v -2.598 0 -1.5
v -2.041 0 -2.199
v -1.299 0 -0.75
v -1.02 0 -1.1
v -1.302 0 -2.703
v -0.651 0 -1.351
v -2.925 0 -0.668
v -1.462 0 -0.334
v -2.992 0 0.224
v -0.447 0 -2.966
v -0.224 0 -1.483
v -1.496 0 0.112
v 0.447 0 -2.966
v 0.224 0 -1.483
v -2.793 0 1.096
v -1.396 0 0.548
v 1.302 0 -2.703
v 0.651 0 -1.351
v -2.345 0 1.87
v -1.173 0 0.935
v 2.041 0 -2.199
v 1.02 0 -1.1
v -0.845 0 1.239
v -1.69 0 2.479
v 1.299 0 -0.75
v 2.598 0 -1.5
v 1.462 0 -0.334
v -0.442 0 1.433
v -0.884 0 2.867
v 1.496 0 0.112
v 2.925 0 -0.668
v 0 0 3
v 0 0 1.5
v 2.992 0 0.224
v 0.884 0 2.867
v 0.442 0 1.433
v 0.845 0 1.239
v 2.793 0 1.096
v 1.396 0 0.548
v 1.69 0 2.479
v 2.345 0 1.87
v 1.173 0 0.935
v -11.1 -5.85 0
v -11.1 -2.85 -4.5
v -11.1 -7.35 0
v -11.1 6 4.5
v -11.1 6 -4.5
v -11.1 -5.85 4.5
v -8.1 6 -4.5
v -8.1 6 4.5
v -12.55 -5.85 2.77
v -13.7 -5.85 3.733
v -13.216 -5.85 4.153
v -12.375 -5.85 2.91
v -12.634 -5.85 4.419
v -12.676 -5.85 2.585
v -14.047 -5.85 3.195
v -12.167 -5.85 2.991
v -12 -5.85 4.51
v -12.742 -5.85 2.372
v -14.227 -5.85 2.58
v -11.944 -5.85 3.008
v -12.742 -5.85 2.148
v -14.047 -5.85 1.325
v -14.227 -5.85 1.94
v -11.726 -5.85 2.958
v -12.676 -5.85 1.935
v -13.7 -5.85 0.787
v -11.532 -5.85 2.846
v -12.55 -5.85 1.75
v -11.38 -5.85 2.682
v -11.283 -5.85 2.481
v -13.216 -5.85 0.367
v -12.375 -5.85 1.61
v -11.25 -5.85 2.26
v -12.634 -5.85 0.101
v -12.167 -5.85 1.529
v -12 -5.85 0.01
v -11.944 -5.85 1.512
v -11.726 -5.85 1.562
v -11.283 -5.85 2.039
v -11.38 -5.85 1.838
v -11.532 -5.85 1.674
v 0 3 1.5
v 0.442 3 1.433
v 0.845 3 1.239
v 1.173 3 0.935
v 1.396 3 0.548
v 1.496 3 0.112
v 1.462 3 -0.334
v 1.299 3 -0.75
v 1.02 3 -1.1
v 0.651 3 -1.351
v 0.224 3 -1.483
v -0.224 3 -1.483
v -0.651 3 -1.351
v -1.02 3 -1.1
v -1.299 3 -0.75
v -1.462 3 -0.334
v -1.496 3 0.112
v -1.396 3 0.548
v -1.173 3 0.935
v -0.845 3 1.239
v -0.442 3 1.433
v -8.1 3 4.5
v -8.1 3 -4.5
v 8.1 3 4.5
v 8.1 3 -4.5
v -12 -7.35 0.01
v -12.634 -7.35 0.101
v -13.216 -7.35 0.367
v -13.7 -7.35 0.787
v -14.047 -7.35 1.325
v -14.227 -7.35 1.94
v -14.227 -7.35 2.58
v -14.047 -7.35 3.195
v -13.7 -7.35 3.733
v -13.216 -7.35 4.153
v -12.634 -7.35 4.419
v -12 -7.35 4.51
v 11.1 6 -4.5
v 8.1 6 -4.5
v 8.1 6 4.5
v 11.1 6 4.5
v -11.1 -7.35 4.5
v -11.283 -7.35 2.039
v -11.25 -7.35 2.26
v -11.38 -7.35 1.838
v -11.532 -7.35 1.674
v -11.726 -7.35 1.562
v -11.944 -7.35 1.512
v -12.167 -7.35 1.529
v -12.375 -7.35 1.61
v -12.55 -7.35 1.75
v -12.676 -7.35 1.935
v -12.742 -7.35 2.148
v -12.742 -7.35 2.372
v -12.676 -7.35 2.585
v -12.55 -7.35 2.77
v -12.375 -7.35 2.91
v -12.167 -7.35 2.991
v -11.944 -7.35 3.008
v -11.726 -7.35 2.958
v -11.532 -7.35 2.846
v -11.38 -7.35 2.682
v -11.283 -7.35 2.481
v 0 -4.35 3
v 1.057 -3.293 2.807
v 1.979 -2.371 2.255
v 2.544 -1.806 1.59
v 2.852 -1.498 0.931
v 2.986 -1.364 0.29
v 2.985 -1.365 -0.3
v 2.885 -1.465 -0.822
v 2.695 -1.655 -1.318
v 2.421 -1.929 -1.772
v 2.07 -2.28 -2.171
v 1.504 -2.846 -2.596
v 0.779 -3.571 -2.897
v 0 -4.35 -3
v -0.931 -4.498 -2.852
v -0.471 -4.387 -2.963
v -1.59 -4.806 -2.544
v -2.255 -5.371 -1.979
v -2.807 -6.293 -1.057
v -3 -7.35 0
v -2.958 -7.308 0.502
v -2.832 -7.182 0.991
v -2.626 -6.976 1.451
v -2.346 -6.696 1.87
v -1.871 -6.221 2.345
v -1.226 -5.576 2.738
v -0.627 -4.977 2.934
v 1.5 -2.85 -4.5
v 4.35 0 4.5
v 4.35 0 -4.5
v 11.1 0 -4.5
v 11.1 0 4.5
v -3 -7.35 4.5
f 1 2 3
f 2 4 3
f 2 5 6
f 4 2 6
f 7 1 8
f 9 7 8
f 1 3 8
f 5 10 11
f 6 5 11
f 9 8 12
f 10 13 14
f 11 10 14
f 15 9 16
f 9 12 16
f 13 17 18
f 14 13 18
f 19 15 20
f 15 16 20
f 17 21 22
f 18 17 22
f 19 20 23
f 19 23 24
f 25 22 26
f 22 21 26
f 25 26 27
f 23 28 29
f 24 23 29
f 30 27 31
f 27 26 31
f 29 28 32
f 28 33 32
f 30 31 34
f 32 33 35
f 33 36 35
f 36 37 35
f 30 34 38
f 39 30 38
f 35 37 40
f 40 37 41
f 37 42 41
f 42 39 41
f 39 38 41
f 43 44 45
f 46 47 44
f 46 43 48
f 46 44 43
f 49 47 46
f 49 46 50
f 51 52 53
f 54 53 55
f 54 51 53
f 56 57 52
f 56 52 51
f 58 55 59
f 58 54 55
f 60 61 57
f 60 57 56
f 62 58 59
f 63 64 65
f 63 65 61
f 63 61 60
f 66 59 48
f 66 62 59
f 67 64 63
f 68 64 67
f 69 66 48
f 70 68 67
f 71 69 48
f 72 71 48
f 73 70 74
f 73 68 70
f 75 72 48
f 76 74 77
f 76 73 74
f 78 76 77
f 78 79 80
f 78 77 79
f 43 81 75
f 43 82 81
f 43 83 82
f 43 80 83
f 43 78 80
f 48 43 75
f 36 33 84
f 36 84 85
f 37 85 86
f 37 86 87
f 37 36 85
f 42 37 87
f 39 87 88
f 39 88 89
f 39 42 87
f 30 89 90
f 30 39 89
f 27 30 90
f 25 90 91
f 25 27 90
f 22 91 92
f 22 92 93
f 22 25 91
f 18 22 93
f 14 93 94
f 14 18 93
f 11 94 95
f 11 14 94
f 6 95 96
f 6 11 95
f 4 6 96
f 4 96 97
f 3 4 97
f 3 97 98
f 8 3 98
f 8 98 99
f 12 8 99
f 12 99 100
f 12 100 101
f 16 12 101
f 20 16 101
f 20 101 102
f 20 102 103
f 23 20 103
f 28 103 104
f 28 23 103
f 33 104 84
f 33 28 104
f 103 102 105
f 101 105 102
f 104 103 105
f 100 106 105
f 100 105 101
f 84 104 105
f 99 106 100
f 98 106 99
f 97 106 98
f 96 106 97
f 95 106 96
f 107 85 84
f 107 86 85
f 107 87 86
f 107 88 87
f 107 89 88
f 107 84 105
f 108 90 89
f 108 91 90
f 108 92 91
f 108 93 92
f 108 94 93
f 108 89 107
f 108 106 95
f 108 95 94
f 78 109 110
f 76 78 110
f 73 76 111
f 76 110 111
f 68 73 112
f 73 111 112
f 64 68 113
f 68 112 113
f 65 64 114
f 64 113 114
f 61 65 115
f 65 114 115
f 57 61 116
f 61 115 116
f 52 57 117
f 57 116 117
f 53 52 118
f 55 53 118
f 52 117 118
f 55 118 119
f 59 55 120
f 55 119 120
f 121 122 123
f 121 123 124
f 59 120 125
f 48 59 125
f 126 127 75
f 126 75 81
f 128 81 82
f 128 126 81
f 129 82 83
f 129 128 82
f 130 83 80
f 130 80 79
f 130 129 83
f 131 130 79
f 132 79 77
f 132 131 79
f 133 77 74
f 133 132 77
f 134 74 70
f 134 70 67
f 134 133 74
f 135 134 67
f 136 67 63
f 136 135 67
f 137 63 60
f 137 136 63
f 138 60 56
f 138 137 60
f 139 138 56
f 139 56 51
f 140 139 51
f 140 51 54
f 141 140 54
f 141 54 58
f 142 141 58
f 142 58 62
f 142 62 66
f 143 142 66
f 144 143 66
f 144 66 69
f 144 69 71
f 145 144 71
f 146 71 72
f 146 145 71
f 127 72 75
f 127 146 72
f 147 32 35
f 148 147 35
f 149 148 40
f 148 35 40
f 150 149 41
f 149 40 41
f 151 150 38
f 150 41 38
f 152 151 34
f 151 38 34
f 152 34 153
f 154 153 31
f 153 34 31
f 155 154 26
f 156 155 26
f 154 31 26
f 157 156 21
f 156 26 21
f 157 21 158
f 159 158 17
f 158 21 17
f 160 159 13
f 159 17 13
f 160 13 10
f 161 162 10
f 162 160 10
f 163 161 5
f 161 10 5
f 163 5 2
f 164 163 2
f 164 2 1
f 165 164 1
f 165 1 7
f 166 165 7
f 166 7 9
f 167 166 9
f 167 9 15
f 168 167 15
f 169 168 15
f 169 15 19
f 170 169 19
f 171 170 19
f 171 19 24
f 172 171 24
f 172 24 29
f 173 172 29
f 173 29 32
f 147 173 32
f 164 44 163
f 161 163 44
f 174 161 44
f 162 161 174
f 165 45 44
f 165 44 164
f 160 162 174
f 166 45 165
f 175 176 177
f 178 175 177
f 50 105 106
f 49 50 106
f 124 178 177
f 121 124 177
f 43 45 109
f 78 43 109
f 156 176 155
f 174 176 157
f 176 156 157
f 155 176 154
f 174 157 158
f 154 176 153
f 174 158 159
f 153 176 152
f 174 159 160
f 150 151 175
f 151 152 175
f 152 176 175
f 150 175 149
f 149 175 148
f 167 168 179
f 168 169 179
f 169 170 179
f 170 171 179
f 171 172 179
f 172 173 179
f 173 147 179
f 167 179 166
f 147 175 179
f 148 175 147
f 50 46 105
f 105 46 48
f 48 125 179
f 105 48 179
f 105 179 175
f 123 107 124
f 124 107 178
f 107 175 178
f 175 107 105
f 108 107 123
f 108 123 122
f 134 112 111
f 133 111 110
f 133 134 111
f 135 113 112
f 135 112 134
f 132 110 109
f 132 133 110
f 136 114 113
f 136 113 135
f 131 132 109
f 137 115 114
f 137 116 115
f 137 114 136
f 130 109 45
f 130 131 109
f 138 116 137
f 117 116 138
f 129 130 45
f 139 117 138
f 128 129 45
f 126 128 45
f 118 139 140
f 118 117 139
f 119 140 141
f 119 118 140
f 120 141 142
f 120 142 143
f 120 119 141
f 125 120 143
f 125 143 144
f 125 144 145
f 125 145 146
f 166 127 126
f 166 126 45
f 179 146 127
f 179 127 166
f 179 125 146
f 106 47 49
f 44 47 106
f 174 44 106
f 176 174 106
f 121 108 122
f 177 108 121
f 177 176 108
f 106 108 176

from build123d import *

# Parameters (mm, degrees)
SKETCH1_W               = 22.2
SKETCH1_H               = 9
SKETCH1_R               = 1.5
BOSS_EXTRUDE1_DEPTH     = 3
SKETCH2_W               = 3
SKETCH2_H               = 9
BOSS_EXTRUDE2_DEPTH     = 3
BOSS_EXTRUDE3_START     = -10.35
BOSS_EXTRUDE3_OUTLINE_R = 0.75
BOSS_EXTRUDE3_DEPTH     = 1.5
SKETCH4_W               = 8.1
SKETCH4_H               = 9
BOSS_EXTRUDE4_DEPTH     = 7.35
CHAMFER1_SIZE           = 7.35
CHAMFER2_SIZE           = 4.5
CUT_EXTRUDE1_START      = -3
SKETCH5_R               = 3
CUT_EXTRUDE1_DEPTH      = 16.180349282


# Read off the part's stored shape, not the designer's step: Boss-Extrude3
with BuildPart() as part:
    # Sketch1 → Boss-Extrude1 (new body)
    with BuildSketch(Plane(origin=(0, 0, 0), x_dir=(1, 0, 0), z_dir=(0, 1, 0))):
        Rectangle(SKETCH1_W, SKETCH1_H)
        with Locations(Location((0, 0, 0), (0, 0, 270))):
            Circle(SKETCH1_R, mode=Mode.SUBTRACT)
    extrude(amount=BOSS_EXTRUDE1_DEPTH)

    # Sketch2 → Boss-Extrude2 (add)
    with BuildSketch(Plane(origin=(0, 3, 0), x_dir=(1, 0, 0), z_dir=(0, 1, 0))):
        with Locations((-9.6, 0)):
            Rectangle(SKETCH2_W, SKETCH2_H)
        with Locations((9.6, 0)):
            Rectangle(SKETCH2_W, SKETCH2_H)
    extrude(amount=BOSS_EXTRUDE2_DEPTH)



with BuildPart() as body_2:
    # Boss-Extrude3 outline → Boss-Extrude3 (new body)
    with BuildSketch(Plane(origin=(0, 3, 0), x_dir=(1, 0, 0), z_dir=(0, 1, 0)).offset(BOSS_EXTRUDE3_START)):
        with BuildLine():
            Line((-12, -4.51), (-11.1, -4.5))
            Line((-11.1, -4.5), (-11.1, 0))
            Line((-11.1, 0), (-12, -0.01))
            ThreePointArc((-12, -0.01), (-14.25, -2.26), (-12, -4.51))
        make_face()
        with Locations((-12, -2.26)):
            Circle(BOSS_EXTRUDE3_OUTLINE_R, mode=Mode.SUBTRACT)
    extrude(amount=BOSS_EXTRUDE3_DEPTH)


with BuildPart() as part_1:
    add(part.part)

    add(body_2.part)  # Boss-Extrude4 merges body 2
    # Sketch4 → Boss-Extrude4 (add)
    with BuildSketch(Plane.XZ):
        with Locations((-7.05, 0)):
            Rectangle(SKETCH4_W, SKETCH4_H)
    extrude(amount=BOSS_EXTRUDE4_DEPTH)

    # Chamfer1
    # the kernel refuses this chamfer: 7.35 mm, written as the material it adds along each edge
    with BuildSketch(Plane(origin=(-3, 0, 4.5), x_dir=(0.9996219169112966, 0.027495876610586372, 0), z_dir=(0, 0, -1))) as chamfer1_piece_1_section:
        Polygon((CHAMFER1_SIZE * 0.999621916911, CHAMFER1_SIZE * 0.0274958766106), (-CHAMFER1_SIZE * 0.0274958766106, CHAMFER1_SIZE * 0.999621916911), (0, 0), align=None)
    chamfer1_piece_1 = extrude(amount=9, mode=Mode.PRIVATE)
    chamfer1_piece_1 = chamfer1_piece_1 - Plane(origin=(0, -1.008100378, 0), x_dir=(0, 0, 1), z_dir=(0, -1, 0)) * Cylinder(1.5, 48, mode=Mode.PRIVATE)
    chamfer1_piece_1 = split(chamfer1_piece_1, bisect_by=Plane(origin=(3.254582701, -7.35, -3), z_dir=(0, 1, 0)), keep=Keep.TOP, mode=Mode.PRIVATE)
    add(chamfer1_piece_1)

    # Chamfer2
    chamfer2_edges = [part_1.edges().sort_by_distance(p)[0] for p in [
        (-7.05, -7.35, -4.5),
    ]]
    chamfer(chamfer2_edges, length=CHAMFER2_SIZE)

    # Sketch5 → Cut-Extrude1 (cut, through all)
    with BuildSketch(Plane(origin=(0, 3, 0), x_dir=(1, 0, 0), z_dir=(0, 1, 0)).offset(CUT_EXTRUDE1_START)):
        with Locations(Location((0, 0, 0), (0, 0, 270))):
            Circle(SKETCH5_R)
    extrude(amount=-CUT_EXTRUDE1_DEPTH, mode=Mode.SUBTRACT)


solid = part_1.part
